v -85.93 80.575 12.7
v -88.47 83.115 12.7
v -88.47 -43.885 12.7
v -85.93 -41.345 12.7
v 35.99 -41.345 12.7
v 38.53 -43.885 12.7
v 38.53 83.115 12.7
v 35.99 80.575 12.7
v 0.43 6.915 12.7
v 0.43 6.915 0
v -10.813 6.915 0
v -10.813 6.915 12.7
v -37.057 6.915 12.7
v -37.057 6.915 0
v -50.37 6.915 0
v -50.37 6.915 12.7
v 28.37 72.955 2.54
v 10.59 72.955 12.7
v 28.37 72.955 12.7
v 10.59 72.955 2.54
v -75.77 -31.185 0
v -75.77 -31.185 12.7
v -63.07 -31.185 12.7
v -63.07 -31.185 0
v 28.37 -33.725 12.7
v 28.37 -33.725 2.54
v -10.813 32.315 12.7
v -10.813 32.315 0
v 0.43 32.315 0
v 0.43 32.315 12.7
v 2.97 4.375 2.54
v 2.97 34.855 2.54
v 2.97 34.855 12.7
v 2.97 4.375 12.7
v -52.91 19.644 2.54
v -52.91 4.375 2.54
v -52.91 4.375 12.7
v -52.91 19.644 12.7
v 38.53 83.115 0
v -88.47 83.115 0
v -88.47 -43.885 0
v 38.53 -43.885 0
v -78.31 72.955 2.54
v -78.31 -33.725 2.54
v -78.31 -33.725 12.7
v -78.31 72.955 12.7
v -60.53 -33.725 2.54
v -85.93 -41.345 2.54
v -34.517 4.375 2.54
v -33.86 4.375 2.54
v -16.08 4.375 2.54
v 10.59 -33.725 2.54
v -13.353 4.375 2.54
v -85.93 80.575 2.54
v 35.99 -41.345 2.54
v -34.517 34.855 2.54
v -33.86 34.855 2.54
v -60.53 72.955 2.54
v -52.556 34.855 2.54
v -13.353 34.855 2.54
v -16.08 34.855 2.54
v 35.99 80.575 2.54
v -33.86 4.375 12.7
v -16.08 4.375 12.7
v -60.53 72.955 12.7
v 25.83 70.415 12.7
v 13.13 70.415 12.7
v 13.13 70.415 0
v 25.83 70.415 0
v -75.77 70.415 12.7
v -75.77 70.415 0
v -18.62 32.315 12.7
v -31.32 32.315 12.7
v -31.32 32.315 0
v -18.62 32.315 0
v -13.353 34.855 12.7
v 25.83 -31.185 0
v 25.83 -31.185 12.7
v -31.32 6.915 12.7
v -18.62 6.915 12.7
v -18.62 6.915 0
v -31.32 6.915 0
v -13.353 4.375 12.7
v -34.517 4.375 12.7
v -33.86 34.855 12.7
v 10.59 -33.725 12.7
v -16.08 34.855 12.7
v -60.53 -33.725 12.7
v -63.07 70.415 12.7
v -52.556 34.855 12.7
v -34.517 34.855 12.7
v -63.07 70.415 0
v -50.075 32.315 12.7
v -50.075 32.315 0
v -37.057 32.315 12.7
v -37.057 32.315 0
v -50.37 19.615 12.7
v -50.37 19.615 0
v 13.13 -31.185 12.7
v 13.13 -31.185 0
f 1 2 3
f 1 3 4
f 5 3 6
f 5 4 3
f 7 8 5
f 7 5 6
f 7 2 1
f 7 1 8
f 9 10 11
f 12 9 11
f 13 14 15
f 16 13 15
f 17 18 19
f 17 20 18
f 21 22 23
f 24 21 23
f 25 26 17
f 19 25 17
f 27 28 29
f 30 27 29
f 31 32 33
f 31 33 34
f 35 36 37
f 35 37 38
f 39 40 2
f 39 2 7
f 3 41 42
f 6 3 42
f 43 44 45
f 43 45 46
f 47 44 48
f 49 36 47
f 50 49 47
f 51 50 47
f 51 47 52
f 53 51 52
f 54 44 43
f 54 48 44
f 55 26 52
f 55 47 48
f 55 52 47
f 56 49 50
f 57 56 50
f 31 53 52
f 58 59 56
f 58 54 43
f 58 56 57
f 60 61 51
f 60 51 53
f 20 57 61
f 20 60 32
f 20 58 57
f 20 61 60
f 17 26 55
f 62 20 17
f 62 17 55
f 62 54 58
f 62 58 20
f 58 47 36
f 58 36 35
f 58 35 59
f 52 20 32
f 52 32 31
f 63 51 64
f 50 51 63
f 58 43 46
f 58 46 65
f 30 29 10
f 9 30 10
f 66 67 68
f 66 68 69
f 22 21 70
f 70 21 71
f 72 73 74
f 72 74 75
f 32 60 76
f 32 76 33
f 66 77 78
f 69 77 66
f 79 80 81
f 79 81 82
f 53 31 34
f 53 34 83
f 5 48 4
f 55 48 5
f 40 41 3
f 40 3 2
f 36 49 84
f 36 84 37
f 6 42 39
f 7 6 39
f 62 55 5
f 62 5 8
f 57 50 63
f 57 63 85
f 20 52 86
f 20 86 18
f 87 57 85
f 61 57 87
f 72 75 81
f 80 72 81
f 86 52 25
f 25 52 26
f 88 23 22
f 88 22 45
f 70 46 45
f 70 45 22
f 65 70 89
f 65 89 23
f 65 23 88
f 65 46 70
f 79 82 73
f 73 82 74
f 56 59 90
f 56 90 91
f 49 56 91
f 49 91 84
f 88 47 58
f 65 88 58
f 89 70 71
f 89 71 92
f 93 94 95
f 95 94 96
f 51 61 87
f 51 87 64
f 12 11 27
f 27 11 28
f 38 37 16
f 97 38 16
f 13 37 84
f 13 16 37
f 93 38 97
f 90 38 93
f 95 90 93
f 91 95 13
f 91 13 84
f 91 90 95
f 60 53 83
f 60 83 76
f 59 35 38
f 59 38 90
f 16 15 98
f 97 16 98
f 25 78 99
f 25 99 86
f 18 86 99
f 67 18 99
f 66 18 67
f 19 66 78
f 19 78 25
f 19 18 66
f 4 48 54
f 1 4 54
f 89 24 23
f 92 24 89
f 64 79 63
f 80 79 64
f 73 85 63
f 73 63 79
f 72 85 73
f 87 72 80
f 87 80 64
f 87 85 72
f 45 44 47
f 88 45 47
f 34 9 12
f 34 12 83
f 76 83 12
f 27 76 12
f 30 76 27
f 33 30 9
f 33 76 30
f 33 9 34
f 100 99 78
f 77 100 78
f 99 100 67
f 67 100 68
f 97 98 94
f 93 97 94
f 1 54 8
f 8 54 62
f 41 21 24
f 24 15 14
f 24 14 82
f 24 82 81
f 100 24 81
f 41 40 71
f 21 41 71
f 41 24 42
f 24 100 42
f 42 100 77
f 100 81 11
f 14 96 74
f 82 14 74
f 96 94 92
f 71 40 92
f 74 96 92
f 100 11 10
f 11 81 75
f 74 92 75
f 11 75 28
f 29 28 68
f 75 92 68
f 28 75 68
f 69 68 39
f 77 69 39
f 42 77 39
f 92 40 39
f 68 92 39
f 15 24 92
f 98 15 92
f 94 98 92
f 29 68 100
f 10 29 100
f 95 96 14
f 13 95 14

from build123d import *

# Parameters (mm, degrees)
F0_W     = 127
F0_H     = 127
F0_W_2   = 12.7
F0_H_2   = 101.6
F1_DEPTH = 12.7
F2_T     = -2.54


with BuildPart() as f1:
    # F0 (on Top) → F1 (new body)
    with BuildSketch(Plane.XY):
        with Locations((-24.9704163089, 19.614642486)):
            Rectangle(F0_W, F0_H)
        with Locations((-69.4204163089, 19.614642486)):
            Rectangle(F0_W_2, F0_H_2, mode=Mode.SUBTRACT)
        Polygon((-50.3704163089, 6.914642486), (-50.3704163089, 19.614642486), (-50.0745723798, 32.314642486), (-37.0573314681, 32.314642486), (-37.0573314681, 6.914642486), align=None, mode=Mode.SUBTRACT)
        Polygon((-31.3204163089, 32.314642486), (-24.9704163089, 32.314642486), (-18.6204163089, 32.314642486), (-18.6204163089, 6.914642486), (-31.3204163089, 6.914642486), align=None, mode=Mode.SUBTRACT)
        Polygon((0.4295836911, 32.314642486), (0.4295836911, 19.614642486), (0.4295836911, 6.914642486), (-10.8125778138, 6.914642486), (-10.8125778138, 32.314642486), align=None, mode=Mode.SUBTRACT)
        with Locations((19.4795836911, 19.614642486)):
            Rectangle(F0_W_2, F0_H_2, mode=Mode.SUBTRACT)
    extrude(amount=F1_DEPTH)

    # F2
    f2_openings = [f1.faces().sort_by_distance(p)[0] for p in [
        (36.733532, 19.614642, 12.7),
    ]]
    offset(amount=F2_T, openings=f2_openings, kind=Kind.INTERSECTION)


solid = f1.part
